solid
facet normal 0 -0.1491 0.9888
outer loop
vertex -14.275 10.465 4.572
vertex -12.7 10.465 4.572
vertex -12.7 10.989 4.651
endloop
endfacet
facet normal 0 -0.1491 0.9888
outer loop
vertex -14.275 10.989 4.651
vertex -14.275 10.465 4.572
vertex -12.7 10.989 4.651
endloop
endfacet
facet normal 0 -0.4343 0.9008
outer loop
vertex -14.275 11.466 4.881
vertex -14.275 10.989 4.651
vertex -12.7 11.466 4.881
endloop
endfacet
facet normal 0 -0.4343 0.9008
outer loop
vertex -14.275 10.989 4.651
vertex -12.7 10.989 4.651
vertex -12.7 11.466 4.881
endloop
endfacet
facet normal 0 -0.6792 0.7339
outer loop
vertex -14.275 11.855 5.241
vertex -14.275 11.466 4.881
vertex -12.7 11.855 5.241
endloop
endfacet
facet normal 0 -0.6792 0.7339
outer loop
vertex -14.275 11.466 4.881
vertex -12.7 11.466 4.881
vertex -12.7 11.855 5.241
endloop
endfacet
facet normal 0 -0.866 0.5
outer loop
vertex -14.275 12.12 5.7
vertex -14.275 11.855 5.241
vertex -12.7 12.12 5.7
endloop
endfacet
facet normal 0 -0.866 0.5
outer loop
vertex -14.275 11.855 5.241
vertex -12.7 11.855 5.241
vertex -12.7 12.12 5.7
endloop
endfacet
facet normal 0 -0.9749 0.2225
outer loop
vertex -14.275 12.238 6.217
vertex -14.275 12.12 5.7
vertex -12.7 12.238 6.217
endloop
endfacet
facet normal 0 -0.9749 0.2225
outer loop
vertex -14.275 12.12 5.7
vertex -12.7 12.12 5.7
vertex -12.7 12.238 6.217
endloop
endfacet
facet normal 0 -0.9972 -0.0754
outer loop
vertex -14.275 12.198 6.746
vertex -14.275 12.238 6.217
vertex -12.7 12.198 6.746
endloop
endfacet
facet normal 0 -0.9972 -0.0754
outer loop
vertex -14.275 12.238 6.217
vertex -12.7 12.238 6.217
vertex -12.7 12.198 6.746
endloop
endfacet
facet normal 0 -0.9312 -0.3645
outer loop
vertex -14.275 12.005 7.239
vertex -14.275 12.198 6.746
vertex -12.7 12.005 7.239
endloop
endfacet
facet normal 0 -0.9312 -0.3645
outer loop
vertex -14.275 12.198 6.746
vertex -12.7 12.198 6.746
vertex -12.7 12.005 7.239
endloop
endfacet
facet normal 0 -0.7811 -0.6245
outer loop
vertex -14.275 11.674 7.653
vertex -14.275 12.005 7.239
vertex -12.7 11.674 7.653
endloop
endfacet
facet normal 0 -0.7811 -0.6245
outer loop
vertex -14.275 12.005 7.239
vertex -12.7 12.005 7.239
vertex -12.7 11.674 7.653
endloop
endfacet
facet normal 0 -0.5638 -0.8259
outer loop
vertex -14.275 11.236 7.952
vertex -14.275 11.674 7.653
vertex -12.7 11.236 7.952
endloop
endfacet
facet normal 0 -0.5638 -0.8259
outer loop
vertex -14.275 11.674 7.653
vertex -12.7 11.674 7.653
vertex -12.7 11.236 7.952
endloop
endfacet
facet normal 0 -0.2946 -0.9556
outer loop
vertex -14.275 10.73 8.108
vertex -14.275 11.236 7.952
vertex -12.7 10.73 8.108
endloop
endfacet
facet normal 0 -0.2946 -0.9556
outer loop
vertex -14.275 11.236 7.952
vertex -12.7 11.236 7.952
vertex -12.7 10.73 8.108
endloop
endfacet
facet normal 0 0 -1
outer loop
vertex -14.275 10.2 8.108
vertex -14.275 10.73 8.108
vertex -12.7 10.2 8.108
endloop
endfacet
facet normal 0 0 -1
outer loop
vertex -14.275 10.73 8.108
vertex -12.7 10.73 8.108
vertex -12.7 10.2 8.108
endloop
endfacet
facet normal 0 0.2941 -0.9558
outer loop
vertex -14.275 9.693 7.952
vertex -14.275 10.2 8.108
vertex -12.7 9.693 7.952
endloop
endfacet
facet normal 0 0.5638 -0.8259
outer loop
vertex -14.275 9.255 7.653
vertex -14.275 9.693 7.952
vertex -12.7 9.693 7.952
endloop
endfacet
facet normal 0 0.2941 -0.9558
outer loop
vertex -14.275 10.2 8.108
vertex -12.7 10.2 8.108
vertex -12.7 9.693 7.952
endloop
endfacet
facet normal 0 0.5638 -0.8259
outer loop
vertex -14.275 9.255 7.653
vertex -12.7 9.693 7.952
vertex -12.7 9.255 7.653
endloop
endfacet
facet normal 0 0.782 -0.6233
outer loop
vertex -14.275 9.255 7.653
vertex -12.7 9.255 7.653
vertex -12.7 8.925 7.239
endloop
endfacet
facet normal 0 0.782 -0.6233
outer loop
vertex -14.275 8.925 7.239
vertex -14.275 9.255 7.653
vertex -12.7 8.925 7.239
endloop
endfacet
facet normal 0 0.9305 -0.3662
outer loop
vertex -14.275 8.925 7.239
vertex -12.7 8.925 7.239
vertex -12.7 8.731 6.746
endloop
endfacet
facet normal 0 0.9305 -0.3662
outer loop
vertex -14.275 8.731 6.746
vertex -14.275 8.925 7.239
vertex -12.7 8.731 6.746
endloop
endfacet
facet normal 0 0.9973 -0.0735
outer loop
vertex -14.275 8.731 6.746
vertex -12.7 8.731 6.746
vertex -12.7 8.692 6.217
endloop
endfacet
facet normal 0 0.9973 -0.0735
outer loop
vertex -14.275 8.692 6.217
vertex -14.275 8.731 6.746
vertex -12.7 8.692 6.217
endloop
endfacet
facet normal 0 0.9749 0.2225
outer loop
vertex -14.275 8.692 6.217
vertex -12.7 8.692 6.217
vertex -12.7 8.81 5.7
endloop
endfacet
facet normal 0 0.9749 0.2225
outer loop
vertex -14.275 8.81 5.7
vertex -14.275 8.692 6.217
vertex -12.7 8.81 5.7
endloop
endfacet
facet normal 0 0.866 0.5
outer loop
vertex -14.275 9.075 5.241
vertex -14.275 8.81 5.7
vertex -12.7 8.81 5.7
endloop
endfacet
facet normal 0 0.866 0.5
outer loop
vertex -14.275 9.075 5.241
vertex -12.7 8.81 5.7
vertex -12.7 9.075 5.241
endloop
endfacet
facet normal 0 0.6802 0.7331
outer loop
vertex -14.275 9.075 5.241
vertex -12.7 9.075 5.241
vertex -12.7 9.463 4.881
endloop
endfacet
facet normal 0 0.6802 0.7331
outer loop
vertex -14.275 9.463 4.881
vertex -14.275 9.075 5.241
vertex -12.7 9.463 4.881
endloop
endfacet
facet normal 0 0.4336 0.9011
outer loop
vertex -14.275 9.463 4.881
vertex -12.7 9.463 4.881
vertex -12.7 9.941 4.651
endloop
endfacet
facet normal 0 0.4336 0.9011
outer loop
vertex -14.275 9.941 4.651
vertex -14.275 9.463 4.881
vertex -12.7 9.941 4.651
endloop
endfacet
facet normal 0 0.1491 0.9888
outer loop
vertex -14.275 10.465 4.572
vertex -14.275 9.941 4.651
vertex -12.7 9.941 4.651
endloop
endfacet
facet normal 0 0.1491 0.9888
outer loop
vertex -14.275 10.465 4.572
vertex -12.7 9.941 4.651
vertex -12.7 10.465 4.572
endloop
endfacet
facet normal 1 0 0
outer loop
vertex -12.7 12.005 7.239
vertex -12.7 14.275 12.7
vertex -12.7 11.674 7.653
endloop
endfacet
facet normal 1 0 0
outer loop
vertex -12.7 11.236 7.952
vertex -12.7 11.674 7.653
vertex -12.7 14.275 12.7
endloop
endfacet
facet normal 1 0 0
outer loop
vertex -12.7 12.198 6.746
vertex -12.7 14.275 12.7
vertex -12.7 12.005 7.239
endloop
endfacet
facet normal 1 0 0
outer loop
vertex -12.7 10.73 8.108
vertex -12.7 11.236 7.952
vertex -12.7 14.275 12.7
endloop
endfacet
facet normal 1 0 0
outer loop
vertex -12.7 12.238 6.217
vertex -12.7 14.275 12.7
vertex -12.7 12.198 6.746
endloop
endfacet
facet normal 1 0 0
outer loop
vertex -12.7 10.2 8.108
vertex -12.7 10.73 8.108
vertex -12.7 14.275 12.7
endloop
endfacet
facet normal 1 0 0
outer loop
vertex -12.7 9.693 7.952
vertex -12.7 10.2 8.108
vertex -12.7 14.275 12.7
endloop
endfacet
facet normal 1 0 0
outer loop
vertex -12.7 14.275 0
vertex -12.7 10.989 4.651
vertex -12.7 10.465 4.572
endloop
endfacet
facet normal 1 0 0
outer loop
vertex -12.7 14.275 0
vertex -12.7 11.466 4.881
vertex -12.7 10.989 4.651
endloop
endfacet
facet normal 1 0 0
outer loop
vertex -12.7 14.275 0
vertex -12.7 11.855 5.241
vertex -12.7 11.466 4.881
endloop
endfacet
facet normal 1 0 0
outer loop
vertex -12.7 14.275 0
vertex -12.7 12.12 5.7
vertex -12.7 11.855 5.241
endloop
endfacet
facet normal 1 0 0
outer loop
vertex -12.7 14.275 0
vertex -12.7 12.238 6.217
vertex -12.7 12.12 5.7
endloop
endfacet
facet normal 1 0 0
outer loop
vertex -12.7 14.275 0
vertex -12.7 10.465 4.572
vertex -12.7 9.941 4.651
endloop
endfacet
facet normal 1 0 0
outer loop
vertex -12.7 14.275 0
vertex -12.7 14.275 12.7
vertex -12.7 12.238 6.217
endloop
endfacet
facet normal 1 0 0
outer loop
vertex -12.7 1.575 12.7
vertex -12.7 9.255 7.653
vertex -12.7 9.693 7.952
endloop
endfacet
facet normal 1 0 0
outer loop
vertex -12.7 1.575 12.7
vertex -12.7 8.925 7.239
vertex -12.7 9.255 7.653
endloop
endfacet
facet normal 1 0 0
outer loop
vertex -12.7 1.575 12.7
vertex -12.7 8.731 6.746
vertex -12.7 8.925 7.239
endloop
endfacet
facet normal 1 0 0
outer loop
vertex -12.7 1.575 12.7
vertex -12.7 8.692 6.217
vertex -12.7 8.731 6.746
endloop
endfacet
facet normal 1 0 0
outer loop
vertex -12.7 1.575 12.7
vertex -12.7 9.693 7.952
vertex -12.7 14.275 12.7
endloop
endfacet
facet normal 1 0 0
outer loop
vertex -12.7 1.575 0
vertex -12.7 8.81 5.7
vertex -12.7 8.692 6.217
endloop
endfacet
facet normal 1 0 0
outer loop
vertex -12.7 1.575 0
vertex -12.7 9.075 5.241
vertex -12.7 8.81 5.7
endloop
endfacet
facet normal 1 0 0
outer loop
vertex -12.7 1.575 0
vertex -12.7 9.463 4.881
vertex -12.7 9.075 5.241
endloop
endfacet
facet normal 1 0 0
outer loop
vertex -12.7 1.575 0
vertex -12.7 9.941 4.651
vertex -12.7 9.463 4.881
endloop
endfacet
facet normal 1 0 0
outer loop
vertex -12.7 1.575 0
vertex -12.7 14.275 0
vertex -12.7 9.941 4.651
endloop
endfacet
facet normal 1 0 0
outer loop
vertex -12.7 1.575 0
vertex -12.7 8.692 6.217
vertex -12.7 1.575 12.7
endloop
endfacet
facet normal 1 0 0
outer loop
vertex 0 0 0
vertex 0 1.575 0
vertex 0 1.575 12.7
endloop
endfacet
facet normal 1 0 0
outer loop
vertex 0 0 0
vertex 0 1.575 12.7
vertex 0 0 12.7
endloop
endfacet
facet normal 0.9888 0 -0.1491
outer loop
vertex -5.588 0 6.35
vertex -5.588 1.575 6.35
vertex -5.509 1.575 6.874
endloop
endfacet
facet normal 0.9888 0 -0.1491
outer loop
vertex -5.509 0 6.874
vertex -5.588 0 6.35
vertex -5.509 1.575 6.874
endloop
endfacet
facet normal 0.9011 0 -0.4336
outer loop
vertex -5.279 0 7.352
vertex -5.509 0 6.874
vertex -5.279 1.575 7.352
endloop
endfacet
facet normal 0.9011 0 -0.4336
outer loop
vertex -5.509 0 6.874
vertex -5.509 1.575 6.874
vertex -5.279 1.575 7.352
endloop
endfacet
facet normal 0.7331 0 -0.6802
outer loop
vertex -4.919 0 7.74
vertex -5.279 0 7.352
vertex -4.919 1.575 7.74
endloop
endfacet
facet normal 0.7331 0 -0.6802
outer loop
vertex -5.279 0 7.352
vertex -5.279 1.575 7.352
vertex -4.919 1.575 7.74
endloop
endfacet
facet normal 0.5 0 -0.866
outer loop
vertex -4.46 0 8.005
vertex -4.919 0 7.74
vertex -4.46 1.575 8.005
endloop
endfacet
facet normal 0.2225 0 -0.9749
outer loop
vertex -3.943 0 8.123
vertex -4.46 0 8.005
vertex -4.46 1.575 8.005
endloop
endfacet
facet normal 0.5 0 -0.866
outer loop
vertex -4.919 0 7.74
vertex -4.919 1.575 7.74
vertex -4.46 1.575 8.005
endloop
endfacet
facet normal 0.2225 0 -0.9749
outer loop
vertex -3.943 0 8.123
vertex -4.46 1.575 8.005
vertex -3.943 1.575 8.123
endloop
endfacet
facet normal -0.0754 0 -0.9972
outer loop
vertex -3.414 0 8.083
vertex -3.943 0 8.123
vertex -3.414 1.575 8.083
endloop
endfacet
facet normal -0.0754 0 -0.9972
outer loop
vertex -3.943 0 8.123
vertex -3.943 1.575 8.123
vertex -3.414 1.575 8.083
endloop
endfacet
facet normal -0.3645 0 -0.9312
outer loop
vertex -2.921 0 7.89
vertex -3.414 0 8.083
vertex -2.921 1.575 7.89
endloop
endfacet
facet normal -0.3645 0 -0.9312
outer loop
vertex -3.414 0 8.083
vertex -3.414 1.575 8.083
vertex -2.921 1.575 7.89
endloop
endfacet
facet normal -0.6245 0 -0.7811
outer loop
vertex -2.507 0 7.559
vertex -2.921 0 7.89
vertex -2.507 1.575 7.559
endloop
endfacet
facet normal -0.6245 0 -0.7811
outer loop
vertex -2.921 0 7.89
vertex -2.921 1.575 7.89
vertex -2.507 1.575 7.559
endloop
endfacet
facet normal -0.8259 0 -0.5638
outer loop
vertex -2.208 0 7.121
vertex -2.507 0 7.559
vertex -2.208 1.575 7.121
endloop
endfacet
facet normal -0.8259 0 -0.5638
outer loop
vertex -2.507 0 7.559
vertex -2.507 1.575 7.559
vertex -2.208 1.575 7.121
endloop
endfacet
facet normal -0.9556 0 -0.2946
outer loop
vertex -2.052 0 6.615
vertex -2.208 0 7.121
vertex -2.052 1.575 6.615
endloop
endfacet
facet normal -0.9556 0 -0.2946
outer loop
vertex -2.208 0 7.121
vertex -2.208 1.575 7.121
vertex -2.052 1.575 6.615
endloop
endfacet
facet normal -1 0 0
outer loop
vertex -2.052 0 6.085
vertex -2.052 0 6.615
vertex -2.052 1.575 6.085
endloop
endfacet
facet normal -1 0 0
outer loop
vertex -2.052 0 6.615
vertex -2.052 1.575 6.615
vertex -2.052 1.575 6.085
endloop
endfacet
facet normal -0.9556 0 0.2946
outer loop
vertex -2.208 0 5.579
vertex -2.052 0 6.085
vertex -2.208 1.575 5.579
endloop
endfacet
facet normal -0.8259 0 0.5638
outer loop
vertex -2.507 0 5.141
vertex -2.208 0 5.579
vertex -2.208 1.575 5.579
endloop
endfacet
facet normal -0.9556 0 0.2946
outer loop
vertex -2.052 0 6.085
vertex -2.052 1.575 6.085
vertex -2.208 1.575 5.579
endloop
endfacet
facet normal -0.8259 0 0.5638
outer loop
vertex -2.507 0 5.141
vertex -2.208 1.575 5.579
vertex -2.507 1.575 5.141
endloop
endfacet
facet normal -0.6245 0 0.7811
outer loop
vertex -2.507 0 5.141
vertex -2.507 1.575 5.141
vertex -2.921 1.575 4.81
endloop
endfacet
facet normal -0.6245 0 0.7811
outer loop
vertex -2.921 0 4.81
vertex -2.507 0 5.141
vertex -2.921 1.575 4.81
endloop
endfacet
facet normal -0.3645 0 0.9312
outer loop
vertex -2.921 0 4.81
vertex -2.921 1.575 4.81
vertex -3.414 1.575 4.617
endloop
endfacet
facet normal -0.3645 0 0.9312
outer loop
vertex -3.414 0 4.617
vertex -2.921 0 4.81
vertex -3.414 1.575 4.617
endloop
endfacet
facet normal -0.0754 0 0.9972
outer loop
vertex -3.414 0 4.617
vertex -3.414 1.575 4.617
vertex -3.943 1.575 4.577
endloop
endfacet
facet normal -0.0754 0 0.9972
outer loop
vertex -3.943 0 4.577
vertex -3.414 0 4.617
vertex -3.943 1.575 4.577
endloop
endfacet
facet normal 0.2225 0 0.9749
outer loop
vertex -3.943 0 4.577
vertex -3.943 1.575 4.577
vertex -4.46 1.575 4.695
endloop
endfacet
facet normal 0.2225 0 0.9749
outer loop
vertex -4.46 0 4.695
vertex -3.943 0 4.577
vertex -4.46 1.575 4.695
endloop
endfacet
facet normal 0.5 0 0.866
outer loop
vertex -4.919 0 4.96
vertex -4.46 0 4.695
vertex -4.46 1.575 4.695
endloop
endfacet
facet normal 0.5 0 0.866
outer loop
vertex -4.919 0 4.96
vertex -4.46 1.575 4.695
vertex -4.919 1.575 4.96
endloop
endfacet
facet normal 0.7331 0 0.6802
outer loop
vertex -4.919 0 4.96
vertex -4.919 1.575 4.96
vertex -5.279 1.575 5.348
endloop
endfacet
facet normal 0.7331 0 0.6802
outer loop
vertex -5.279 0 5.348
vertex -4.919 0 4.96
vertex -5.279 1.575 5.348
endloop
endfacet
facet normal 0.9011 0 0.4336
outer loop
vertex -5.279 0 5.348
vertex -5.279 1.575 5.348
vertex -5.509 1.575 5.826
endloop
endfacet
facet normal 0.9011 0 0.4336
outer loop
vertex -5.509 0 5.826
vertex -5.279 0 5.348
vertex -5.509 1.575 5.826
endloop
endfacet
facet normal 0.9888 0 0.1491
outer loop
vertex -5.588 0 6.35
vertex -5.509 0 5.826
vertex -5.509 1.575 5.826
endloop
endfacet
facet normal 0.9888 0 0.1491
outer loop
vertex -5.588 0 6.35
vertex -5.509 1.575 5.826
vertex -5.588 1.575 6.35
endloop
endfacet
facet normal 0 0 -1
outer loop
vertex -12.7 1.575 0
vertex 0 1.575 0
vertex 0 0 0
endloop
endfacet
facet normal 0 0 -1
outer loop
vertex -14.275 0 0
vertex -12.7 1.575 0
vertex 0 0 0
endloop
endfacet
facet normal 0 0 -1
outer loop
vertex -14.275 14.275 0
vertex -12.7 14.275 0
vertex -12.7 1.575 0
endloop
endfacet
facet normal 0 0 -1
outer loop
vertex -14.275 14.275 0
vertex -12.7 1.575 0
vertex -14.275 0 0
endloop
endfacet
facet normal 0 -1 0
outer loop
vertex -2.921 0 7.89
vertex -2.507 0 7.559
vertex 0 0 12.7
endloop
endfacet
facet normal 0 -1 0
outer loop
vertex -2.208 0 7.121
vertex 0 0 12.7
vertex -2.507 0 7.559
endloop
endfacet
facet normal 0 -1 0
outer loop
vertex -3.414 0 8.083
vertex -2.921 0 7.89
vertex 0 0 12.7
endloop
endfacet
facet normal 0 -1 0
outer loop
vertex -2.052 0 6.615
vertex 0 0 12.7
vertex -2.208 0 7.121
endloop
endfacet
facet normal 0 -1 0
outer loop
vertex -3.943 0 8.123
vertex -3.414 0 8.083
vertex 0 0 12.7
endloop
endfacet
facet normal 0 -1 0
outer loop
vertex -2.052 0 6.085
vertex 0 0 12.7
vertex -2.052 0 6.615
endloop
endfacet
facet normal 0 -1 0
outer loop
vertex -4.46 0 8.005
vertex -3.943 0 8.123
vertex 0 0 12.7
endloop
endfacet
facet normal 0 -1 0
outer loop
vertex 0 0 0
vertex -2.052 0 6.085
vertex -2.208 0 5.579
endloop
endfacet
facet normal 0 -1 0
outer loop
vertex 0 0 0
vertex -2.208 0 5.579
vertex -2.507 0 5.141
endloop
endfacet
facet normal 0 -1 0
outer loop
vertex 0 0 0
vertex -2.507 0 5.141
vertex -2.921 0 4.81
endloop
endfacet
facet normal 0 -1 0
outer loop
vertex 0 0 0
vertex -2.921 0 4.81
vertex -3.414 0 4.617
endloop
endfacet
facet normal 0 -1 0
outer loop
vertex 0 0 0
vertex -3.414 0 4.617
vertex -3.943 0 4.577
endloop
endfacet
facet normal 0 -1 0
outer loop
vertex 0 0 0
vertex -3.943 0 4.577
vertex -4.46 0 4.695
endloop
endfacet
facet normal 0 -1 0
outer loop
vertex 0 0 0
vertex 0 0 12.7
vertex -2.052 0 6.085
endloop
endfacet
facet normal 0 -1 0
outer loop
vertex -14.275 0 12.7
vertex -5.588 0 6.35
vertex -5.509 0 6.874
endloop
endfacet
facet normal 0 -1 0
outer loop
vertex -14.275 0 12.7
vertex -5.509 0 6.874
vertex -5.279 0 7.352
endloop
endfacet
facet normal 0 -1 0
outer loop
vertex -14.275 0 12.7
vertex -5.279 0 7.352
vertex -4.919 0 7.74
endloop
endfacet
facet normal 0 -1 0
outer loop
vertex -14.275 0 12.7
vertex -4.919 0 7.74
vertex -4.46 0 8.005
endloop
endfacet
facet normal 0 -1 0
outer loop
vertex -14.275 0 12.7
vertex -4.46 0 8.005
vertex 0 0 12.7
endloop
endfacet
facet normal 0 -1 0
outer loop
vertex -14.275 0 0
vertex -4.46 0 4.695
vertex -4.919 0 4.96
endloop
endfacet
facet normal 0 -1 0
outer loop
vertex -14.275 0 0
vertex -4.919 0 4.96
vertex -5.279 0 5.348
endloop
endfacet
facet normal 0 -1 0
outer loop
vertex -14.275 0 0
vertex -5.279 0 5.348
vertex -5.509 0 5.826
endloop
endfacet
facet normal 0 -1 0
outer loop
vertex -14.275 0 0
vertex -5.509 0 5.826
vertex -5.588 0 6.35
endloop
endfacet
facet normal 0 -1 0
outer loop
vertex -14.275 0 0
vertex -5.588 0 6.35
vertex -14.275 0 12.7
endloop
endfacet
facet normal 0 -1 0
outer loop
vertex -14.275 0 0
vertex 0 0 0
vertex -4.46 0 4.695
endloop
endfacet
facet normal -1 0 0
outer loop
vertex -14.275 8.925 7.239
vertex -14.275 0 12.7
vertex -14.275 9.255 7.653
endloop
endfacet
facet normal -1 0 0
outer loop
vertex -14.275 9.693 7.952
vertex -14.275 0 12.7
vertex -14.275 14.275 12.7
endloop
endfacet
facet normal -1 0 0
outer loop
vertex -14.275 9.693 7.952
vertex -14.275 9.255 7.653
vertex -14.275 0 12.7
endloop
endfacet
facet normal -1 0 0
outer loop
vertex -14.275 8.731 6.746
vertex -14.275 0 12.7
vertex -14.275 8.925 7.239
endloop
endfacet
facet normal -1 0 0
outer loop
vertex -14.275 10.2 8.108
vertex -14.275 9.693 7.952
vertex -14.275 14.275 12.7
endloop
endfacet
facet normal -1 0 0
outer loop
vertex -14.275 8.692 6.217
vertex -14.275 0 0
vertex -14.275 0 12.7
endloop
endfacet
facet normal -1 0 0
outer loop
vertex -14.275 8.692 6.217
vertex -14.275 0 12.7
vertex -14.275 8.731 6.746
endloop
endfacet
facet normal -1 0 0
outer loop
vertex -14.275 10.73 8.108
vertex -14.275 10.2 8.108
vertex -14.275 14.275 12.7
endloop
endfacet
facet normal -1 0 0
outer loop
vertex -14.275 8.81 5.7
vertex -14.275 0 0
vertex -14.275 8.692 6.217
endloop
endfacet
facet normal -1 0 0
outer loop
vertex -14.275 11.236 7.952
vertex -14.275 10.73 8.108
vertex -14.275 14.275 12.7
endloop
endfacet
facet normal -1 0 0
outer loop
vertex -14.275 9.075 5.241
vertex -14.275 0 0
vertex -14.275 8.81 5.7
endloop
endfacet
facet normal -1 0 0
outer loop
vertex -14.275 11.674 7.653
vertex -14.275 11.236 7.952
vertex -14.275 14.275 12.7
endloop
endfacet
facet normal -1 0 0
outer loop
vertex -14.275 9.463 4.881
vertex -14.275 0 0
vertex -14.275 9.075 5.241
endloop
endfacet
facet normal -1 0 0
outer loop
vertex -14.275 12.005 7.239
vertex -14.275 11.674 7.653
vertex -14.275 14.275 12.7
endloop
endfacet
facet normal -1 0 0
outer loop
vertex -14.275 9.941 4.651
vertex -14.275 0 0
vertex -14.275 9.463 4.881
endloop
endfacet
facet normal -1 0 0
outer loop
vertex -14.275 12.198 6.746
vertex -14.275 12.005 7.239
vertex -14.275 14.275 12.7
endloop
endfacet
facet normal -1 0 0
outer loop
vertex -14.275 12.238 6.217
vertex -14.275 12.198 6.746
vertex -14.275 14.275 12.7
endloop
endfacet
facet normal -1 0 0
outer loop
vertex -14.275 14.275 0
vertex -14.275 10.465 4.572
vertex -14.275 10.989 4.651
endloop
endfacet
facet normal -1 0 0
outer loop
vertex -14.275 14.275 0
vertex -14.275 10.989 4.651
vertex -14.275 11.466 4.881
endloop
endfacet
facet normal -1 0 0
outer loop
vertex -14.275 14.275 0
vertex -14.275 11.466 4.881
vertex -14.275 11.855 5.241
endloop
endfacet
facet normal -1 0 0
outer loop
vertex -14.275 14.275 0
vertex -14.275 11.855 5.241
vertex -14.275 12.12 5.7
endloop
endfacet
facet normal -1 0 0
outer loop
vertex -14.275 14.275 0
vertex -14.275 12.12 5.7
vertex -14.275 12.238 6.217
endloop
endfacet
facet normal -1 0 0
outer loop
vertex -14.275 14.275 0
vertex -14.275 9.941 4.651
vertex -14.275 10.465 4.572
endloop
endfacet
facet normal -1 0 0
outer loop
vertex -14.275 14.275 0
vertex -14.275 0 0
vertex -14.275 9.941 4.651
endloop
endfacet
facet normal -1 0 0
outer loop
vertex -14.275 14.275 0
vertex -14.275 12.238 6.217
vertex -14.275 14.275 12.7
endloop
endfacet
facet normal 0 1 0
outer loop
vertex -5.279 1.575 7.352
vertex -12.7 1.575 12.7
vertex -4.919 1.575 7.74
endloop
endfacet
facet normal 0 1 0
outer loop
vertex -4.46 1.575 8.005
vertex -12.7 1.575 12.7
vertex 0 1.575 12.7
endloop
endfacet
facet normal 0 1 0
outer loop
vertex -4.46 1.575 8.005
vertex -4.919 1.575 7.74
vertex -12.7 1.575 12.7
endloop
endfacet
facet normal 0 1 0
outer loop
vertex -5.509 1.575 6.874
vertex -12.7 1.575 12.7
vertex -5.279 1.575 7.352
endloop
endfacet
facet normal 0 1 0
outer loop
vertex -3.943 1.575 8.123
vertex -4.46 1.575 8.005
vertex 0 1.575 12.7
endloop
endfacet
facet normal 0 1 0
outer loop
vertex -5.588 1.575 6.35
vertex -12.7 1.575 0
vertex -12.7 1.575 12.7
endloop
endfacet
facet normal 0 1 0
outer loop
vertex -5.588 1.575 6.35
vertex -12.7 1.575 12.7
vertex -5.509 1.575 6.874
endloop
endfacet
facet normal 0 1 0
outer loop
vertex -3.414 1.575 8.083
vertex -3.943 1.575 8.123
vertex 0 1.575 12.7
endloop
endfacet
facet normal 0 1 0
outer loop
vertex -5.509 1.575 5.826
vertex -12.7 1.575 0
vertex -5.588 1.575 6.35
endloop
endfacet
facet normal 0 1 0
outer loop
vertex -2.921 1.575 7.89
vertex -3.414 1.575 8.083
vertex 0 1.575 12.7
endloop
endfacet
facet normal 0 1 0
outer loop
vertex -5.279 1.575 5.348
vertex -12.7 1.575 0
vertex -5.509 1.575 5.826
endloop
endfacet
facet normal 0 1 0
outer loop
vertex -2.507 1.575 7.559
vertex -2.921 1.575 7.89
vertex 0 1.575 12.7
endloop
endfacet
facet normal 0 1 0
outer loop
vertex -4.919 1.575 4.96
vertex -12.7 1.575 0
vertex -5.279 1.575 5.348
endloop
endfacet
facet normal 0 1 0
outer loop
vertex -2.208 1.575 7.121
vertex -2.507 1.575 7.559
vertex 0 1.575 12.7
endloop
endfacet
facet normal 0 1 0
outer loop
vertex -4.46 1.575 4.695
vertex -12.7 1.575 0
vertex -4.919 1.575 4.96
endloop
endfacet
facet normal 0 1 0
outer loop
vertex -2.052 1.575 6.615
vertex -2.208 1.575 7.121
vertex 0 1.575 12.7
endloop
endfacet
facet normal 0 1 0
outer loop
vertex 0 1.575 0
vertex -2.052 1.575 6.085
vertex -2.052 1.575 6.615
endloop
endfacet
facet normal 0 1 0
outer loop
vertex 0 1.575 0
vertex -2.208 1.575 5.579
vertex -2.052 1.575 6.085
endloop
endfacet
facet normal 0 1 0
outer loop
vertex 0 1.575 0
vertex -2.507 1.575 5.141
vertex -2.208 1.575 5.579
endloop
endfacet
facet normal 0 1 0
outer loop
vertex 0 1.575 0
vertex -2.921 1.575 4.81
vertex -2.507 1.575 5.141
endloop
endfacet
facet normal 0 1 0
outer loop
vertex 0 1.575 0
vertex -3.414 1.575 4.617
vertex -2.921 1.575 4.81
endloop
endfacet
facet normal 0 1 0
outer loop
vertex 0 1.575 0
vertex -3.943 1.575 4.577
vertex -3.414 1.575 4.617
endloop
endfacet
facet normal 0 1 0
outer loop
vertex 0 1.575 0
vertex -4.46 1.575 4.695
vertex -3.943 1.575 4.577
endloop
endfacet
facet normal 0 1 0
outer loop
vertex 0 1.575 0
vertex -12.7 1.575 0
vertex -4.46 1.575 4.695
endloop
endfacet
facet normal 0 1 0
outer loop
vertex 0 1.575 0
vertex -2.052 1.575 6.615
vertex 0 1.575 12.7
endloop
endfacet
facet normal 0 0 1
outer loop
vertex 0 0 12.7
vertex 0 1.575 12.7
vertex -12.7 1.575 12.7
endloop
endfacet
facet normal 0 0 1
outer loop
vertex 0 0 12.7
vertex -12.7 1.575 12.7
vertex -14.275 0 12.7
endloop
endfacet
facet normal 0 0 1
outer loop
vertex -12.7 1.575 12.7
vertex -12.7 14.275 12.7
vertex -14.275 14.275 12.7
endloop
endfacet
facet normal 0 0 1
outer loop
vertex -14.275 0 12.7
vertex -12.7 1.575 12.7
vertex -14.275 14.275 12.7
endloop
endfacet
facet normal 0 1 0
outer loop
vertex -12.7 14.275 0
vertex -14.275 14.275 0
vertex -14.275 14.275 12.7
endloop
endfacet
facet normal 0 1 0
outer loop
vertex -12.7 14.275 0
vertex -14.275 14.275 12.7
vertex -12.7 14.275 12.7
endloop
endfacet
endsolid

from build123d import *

# Parameters (mm, degrees)
EXTRUDE1_DEPTH     = 12.7
SKETCH2_R          = 1.778
CUT_EXTRUDE1_DEPTH = 7.1374
SKETCH4_R          = 1.778
CUT_EXTRUDE2_DEPTH = 7.1374


with BuildPart() as part:
    # Sketch1 → Extrude1 (new body)
    with BuildSketch(Plane.XY):
        Polygon((0, 0), (-14.2748, 0), (-14.2748, 14.2748), (-12.7, 14.2748), (-12.7, 1.5748), (0, 1.5748), align=None)
    extrude(amount=EXTRUDE1_DEPTH)

    # Sketch2 → Cut-Extrude1 (cut)
    with BuildSketch(Plane(origin=(-12.7, 0, 0), x_dir=(0, 0, -1), z_dir=(1, 0, 0))):
        with Locations((-6.35, 10.4648)):
            Circle(SKETCH2_R)
    extrude(amount=-CUT_EXTRUDE1_DEPTH, mode=Mode.SUBTRACT)

    # Sketch4 → Cut-Extrude2 (cut)
    with BuildSketch(Plane(origin=(0, 1.5748, 0), x_dir=(-1, 0, 0), z_dir=(0, 1, 0))):
        with Locations((3.81, 6.35)):
            Circle(SKETCH4_R)
    extrude(amount=-CUT_EXTRUDE2_DEPTH, mode=Mode.SUBTRACT)


solid = part.part
